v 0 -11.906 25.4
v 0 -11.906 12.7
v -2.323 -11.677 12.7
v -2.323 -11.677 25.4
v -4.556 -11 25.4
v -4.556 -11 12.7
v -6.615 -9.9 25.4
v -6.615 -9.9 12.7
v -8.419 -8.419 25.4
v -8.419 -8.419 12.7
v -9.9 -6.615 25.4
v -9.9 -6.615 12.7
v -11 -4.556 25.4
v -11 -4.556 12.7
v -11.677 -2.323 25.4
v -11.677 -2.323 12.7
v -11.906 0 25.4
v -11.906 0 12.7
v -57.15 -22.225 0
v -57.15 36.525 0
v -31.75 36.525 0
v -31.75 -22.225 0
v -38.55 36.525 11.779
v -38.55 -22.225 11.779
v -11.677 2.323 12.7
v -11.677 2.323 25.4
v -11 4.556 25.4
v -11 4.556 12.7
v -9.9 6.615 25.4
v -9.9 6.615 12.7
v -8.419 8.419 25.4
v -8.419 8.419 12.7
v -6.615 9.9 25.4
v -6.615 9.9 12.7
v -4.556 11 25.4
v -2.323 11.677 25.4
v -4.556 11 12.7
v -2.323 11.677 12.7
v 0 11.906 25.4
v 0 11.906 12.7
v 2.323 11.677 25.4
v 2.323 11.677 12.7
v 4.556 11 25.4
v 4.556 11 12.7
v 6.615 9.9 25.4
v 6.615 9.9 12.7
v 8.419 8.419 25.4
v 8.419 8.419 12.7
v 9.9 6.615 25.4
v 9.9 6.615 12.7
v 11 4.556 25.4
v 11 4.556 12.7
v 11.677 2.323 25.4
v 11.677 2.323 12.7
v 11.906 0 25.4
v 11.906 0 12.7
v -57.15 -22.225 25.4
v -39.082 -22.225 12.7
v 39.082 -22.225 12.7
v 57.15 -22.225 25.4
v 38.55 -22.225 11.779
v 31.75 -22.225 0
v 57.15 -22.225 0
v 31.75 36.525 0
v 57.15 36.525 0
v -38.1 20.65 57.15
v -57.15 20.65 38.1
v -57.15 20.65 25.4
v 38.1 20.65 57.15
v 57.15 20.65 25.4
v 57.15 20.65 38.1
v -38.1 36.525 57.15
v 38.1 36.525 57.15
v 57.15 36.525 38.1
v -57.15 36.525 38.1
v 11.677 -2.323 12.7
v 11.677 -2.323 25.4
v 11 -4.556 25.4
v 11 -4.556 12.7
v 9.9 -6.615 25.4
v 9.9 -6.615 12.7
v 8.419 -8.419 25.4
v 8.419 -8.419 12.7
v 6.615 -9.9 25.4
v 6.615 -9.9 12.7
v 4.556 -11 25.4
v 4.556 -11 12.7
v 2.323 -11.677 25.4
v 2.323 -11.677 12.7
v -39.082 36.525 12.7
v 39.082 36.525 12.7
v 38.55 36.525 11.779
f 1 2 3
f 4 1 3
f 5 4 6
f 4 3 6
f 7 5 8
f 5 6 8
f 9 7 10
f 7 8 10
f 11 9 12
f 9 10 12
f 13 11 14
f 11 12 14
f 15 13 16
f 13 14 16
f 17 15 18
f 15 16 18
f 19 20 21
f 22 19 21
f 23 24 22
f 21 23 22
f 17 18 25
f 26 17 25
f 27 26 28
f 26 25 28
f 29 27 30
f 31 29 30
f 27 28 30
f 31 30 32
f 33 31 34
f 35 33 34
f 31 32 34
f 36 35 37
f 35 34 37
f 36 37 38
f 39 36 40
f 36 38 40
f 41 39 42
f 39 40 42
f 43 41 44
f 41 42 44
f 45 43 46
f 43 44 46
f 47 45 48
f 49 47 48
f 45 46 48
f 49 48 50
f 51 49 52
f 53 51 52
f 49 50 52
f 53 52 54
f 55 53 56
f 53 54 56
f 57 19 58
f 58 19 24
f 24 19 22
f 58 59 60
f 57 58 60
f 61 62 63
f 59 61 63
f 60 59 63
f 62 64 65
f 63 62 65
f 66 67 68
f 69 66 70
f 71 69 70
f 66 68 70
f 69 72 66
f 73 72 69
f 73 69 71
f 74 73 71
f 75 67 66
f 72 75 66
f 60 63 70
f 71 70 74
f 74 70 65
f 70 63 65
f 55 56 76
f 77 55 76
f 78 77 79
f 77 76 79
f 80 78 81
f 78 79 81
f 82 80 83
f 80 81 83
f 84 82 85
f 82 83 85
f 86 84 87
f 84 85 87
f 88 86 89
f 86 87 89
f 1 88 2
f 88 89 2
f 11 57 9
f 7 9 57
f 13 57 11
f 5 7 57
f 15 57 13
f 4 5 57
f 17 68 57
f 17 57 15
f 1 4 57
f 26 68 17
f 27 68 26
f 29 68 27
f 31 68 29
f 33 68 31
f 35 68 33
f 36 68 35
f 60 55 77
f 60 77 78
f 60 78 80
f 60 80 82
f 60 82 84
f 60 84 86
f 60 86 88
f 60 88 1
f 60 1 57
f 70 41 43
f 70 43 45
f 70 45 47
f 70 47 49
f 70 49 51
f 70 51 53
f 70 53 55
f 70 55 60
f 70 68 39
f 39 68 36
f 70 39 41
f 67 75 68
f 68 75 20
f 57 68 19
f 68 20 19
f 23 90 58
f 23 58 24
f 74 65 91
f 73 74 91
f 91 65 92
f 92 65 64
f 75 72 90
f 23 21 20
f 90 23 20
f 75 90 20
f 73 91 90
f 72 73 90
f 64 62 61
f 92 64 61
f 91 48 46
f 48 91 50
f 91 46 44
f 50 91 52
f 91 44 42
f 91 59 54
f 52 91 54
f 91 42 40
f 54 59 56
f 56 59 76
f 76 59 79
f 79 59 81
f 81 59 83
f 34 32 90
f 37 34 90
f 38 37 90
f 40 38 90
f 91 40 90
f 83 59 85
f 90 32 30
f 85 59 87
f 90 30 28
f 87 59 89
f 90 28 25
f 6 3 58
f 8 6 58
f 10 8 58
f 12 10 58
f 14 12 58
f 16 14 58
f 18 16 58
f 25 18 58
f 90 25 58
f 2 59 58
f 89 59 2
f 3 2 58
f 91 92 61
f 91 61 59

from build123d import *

# Parameters (mm, degrees)
F0_W     = 19.05
F0_H     = 15.875
F0_W_2   = 76.2
F1_DEPTH = 57.15
F2_DEPTH = 25.4
F4_DEPTH = 15.875
F6_DEPTH = 58.7502


with BuildPart() as f1:
    # F0 (on Top) → F1 (new body)
    with BuildSketch(Plane.XY):
        with Locations((-47.625, 28.5877)):
            Rectangle(F0_W, F0_H)
        with Locations((0, 28.5877)):
            Rectangle(F0_W_2, F0_H)
        with Locations((47.625, 28.5877)):
            Rectangle(F0_W, F0_H)
    extrude(amount=F1_DEPTH)

    # F0 (on Top) → F2 (join)
    with BuildSketch(Plane.XY):
        with BuildLine():
            ThreePointArc((-11.90625, 0), (0, 11.90625), (11.90625, 0))
            Line((11.90625, 0), (57.15, 0))
            Line((57.15, 0), (57.15, 20.6502))
            Line((57.15, 20.6502), (38.1, 20.6502))
            Line((38.1, 20.6502), (-38.1, 20.6502))
            Line((-38.1, 20.6502), (-57.15, 20.6502))
            Line((-57.15, 20.6502), (-57.15, 0))
            Line((-57.15, 0), (-11.90625, 0))
        make_face()
        with BuildLine():
            ThreePointArc((0, -11.90625), (-8.41899, -8.41899), (-11.90625, 0))
            Line((-11.90625, 0), (-57.15, 0))
            Line((-57.15, 0), (-57.15, -22.225))
            Line((-57.15, -22.225), (0, -22.225))
            Line((0, -22.225), (0, -11.90625))
        make_face()
        with BuildLine():
            Line((57.15, 0), (11.90625, 0))
            ThreePointArc((11.90625, 0), (8.41899, -8.41899), (0, -11.90625))
            Line((0, -11.90625), (0, -22.225))
            Line((0, -22.225), (57.15, -22.225))
            Line((57.15, -22.225), (57.15, 0))
        make_face()
    extrude(amount=F2_DEPTH)

    # F3 (on face) → F4 (cut)
    with BuildSketch(Plane.XZ.offset(-20.6502)):
        Polygon((-38.1, 57.15), (-57.15, 57.15), (-57.15, 38.1), align=None)
        Polygon((57.15, 57.15), (38.1, 57.15), (57.15, 38.1), align=None)
    extrude(amount=-F4_DEPTH, mode=Mode.SUBTRACT)

    # F5 (on face) → F6 (cut)
    with BuildSketch(Plane.XZ.offset(22.225)):
        Polygon((-38.550498, 11.778808), (-31.75, 0), (0, 0), (0, 12.7), (-39.082348, 12.7), align=None)
        Polygon((0, 12.7), (0, 0), (31.75, 0), (38.550498, 11.778808), (39.082348, 12.7), align=None)
    extrude(amount=-F6_DEPTH, mode=Mode.SUBTRACT)


solid = f1.part
